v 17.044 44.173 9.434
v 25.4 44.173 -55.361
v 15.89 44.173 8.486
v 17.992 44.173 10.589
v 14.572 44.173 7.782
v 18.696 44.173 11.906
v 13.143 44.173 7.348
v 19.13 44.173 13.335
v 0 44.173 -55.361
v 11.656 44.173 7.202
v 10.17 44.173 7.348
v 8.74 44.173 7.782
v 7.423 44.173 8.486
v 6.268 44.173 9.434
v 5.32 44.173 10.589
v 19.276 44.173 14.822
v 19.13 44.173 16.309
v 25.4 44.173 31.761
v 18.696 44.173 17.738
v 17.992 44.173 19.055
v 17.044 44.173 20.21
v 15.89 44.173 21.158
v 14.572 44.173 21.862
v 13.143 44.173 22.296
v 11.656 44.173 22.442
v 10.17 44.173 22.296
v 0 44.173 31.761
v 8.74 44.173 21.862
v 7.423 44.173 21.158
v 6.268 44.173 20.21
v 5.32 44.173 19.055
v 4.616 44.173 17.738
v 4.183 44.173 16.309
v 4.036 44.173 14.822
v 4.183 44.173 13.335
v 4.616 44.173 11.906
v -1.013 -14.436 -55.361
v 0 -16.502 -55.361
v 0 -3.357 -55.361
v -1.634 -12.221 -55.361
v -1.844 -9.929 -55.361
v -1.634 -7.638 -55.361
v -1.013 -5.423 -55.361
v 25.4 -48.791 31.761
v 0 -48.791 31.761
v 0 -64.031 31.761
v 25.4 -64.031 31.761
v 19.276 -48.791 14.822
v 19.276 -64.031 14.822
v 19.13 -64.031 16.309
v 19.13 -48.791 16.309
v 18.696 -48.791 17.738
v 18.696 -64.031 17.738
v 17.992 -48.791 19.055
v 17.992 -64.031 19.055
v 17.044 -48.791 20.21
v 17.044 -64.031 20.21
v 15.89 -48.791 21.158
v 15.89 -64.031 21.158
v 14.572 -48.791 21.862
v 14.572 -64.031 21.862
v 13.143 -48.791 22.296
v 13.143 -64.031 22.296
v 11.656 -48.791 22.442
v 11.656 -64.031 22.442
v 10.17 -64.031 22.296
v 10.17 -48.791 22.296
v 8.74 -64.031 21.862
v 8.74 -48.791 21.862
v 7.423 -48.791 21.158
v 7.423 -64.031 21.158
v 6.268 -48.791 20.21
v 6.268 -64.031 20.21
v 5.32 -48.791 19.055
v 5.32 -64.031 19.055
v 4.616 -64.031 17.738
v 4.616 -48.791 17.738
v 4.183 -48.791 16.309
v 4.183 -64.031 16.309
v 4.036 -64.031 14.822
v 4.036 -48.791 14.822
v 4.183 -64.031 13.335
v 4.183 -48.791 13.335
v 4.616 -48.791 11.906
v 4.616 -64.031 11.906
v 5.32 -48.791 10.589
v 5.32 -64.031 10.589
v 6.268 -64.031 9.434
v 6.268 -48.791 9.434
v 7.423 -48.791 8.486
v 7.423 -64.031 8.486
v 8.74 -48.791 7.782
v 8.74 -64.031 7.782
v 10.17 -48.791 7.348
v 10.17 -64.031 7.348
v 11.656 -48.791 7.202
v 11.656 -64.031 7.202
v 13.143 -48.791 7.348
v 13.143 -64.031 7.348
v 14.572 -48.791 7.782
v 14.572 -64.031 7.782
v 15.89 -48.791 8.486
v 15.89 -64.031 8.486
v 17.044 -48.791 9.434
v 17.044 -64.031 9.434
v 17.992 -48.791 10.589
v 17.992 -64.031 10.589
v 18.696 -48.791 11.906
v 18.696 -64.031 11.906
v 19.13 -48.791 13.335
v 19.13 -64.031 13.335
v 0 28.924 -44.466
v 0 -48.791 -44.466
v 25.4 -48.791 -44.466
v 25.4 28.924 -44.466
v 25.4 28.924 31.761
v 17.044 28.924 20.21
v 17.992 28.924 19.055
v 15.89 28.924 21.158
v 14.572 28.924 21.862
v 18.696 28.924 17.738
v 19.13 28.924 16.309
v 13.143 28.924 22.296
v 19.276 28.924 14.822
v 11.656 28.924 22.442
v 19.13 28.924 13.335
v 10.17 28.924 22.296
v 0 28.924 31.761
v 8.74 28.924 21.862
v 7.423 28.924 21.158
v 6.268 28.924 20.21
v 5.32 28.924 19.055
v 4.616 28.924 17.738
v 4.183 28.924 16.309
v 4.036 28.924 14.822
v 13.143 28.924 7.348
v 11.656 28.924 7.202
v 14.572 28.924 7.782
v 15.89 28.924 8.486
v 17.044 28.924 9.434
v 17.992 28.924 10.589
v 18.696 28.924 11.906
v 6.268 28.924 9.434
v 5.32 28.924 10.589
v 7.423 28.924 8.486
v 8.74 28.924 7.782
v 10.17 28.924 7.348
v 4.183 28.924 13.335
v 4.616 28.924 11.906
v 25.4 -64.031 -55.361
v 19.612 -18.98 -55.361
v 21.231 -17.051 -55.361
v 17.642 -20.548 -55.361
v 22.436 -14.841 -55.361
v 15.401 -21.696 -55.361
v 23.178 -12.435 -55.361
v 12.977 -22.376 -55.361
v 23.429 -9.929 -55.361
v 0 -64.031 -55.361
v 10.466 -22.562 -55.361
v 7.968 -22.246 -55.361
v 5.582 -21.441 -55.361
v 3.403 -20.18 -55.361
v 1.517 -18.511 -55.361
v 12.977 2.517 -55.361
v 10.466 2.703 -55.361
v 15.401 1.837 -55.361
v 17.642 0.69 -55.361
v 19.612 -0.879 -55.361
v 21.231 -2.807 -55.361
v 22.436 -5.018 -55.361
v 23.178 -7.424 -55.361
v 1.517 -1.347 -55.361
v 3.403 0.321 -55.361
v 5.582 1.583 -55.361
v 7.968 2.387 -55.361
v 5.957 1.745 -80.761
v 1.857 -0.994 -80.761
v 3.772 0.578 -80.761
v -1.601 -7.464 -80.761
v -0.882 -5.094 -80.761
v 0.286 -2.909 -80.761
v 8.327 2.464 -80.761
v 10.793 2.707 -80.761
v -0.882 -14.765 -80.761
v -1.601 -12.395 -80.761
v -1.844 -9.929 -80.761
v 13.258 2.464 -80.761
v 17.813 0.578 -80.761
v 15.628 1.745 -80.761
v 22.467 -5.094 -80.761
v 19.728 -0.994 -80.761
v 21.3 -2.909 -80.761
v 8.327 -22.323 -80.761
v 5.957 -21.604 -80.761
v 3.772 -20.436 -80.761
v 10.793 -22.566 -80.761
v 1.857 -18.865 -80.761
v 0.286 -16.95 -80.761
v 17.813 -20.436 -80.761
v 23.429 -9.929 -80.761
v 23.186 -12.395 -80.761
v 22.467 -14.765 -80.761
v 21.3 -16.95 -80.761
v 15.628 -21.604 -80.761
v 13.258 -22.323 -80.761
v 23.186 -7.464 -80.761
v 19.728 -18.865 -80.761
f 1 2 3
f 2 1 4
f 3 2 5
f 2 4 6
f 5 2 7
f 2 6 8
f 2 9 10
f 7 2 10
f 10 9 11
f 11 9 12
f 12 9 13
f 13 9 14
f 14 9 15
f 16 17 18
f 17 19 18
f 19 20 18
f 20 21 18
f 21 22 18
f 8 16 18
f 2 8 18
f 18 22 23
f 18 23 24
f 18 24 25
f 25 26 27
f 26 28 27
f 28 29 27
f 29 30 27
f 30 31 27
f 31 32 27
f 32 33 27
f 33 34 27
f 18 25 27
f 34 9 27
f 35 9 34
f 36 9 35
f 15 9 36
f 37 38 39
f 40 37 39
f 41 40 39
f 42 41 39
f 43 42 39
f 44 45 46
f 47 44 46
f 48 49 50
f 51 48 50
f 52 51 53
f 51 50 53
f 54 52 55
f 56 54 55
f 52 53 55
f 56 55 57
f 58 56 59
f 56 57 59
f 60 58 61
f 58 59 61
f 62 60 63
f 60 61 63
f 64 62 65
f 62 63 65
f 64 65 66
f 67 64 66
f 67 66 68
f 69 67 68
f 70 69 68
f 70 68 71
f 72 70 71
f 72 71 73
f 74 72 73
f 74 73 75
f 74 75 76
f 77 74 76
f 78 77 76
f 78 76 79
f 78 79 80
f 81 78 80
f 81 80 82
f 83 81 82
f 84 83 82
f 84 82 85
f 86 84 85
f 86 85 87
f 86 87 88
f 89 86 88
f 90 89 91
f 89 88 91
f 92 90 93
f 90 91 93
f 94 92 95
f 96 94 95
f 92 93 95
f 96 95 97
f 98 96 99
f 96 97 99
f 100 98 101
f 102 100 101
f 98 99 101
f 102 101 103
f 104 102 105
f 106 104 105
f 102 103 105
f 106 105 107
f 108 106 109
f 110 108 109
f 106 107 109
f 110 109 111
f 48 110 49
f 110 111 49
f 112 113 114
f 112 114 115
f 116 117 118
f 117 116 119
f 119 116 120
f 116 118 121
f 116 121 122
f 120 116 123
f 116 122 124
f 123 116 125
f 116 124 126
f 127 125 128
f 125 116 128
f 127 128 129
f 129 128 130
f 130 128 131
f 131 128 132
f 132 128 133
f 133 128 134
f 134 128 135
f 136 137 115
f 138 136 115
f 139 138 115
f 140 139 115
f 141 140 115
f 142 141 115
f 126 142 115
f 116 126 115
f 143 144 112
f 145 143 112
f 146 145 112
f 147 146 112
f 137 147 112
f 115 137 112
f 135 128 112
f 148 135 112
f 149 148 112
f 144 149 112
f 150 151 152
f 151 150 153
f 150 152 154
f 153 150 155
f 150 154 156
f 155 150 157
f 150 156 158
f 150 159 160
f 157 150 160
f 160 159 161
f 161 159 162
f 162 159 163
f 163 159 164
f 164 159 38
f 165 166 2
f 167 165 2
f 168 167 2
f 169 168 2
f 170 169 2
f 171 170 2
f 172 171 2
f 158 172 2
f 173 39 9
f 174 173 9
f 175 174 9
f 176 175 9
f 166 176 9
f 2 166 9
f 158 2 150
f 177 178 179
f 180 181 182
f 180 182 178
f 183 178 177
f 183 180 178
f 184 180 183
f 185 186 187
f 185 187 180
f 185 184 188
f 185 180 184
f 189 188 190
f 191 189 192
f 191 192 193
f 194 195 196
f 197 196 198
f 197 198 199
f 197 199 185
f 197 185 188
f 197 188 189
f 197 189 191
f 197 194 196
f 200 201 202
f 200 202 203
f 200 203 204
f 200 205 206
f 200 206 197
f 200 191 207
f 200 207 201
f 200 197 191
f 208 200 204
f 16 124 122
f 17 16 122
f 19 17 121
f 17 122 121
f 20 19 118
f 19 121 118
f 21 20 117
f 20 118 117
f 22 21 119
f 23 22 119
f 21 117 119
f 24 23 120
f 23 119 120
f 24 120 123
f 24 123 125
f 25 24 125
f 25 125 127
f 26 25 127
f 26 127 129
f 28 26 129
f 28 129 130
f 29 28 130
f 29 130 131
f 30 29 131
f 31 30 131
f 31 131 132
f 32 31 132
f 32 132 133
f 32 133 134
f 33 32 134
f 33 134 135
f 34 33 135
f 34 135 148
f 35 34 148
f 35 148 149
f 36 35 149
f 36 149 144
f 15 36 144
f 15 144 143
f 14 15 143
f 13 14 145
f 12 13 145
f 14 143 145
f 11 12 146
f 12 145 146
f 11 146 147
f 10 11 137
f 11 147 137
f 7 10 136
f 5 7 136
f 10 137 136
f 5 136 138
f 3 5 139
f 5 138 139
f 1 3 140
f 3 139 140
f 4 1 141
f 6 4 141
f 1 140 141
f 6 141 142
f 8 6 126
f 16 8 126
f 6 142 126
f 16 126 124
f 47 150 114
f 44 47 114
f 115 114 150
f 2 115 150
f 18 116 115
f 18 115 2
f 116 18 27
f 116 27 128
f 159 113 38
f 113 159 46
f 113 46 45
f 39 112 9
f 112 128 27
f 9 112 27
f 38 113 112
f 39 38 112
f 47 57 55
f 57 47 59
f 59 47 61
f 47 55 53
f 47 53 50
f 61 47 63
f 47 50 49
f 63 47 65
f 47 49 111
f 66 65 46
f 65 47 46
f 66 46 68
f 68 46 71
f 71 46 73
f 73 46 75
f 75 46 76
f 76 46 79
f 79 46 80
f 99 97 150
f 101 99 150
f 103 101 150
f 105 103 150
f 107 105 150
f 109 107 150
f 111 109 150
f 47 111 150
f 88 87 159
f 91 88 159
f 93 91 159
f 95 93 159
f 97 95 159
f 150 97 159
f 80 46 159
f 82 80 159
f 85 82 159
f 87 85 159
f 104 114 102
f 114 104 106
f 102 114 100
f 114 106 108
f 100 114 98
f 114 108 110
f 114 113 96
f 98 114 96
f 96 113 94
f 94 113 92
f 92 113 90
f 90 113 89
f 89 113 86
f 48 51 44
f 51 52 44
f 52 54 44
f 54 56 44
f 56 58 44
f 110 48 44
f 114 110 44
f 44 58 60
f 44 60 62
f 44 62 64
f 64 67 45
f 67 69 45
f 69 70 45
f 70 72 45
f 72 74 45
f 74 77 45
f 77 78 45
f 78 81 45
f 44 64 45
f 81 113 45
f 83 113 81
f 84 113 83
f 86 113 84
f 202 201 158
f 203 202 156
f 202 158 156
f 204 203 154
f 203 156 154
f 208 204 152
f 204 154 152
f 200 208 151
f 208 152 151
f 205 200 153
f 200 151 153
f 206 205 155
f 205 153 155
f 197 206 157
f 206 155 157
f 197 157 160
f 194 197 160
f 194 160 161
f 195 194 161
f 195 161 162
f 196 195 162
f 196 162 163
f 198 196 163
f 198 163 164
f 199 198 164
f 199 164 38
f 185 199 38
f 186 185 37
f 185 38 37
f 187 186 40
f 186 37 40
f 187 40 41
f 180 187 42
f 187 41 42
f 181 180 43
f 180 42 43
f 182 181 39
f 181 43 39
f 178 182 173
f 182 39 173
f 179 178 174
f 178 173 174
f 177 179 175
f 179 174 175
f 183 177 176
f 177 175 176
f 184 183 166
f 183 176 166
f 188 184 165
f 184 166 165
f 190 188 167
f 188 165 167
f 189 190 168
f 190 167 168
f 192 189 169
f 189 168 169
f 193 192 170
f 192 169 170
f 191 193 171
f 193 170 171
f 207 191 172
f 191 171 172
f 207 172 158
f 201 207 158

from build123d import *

# Parameters (mm, degrees)
F0_W     = 77.7157761486
F0_H     = 10.8950532058
F1_DEPTH = 25.4
F2_R     = 7.62
F3_DEPTH = 127
F4_R     = 12.6365
F5_DEPTH = 25.4


with BuildPart() as f1:
    # F0 (on Right) → F1 (new body)
    with BuildSketch(Plane.YZ):
        Polygon((-48.7912997933, 31.7609666863), (-64.0312997933, 31.7609666863), (-64.0312997933, -55.3610383549), (-48.7912997933, -55.3610383549), (-48.7912997933, -44.4659851491), align=None)
        Polygon((28.9244763553, 31.7609666863), (28.9244763553, -44.4659851491), (28.9244763553, -55.3610383549), (44.1727048095, -55.3610383549), (44.1727048095, 31.7609666863), align=None)
        with Locations((-9.933411719, -49.913511752)):
            Rectangle(F0_W, F0_H)
    extrude(amount=F1_DEPTH)

    # F2 (on face) → F3 (cut)
    with BuildSketch(Plane.XZ.offset(64.0312997933)):
        with Locations((11.656133458, 14.8219969124)):
            Circle(F2_R)
    extrude(amount=-F3_DEPTH, mode=Mode.SUBTRACT)

    # F4 (on face) → F5 (join)
    with BuildSketch(Plane(origin=(0, 0, -55.3610383549), x_dir=(1, 0, 0), z_dir=(0, 0, -1))):
        with Locations((10.7927164063, 9.9292974919)):
            Circle(F4_R)
    extrude(amount=F5_DEPTH)


solid = f1.part
